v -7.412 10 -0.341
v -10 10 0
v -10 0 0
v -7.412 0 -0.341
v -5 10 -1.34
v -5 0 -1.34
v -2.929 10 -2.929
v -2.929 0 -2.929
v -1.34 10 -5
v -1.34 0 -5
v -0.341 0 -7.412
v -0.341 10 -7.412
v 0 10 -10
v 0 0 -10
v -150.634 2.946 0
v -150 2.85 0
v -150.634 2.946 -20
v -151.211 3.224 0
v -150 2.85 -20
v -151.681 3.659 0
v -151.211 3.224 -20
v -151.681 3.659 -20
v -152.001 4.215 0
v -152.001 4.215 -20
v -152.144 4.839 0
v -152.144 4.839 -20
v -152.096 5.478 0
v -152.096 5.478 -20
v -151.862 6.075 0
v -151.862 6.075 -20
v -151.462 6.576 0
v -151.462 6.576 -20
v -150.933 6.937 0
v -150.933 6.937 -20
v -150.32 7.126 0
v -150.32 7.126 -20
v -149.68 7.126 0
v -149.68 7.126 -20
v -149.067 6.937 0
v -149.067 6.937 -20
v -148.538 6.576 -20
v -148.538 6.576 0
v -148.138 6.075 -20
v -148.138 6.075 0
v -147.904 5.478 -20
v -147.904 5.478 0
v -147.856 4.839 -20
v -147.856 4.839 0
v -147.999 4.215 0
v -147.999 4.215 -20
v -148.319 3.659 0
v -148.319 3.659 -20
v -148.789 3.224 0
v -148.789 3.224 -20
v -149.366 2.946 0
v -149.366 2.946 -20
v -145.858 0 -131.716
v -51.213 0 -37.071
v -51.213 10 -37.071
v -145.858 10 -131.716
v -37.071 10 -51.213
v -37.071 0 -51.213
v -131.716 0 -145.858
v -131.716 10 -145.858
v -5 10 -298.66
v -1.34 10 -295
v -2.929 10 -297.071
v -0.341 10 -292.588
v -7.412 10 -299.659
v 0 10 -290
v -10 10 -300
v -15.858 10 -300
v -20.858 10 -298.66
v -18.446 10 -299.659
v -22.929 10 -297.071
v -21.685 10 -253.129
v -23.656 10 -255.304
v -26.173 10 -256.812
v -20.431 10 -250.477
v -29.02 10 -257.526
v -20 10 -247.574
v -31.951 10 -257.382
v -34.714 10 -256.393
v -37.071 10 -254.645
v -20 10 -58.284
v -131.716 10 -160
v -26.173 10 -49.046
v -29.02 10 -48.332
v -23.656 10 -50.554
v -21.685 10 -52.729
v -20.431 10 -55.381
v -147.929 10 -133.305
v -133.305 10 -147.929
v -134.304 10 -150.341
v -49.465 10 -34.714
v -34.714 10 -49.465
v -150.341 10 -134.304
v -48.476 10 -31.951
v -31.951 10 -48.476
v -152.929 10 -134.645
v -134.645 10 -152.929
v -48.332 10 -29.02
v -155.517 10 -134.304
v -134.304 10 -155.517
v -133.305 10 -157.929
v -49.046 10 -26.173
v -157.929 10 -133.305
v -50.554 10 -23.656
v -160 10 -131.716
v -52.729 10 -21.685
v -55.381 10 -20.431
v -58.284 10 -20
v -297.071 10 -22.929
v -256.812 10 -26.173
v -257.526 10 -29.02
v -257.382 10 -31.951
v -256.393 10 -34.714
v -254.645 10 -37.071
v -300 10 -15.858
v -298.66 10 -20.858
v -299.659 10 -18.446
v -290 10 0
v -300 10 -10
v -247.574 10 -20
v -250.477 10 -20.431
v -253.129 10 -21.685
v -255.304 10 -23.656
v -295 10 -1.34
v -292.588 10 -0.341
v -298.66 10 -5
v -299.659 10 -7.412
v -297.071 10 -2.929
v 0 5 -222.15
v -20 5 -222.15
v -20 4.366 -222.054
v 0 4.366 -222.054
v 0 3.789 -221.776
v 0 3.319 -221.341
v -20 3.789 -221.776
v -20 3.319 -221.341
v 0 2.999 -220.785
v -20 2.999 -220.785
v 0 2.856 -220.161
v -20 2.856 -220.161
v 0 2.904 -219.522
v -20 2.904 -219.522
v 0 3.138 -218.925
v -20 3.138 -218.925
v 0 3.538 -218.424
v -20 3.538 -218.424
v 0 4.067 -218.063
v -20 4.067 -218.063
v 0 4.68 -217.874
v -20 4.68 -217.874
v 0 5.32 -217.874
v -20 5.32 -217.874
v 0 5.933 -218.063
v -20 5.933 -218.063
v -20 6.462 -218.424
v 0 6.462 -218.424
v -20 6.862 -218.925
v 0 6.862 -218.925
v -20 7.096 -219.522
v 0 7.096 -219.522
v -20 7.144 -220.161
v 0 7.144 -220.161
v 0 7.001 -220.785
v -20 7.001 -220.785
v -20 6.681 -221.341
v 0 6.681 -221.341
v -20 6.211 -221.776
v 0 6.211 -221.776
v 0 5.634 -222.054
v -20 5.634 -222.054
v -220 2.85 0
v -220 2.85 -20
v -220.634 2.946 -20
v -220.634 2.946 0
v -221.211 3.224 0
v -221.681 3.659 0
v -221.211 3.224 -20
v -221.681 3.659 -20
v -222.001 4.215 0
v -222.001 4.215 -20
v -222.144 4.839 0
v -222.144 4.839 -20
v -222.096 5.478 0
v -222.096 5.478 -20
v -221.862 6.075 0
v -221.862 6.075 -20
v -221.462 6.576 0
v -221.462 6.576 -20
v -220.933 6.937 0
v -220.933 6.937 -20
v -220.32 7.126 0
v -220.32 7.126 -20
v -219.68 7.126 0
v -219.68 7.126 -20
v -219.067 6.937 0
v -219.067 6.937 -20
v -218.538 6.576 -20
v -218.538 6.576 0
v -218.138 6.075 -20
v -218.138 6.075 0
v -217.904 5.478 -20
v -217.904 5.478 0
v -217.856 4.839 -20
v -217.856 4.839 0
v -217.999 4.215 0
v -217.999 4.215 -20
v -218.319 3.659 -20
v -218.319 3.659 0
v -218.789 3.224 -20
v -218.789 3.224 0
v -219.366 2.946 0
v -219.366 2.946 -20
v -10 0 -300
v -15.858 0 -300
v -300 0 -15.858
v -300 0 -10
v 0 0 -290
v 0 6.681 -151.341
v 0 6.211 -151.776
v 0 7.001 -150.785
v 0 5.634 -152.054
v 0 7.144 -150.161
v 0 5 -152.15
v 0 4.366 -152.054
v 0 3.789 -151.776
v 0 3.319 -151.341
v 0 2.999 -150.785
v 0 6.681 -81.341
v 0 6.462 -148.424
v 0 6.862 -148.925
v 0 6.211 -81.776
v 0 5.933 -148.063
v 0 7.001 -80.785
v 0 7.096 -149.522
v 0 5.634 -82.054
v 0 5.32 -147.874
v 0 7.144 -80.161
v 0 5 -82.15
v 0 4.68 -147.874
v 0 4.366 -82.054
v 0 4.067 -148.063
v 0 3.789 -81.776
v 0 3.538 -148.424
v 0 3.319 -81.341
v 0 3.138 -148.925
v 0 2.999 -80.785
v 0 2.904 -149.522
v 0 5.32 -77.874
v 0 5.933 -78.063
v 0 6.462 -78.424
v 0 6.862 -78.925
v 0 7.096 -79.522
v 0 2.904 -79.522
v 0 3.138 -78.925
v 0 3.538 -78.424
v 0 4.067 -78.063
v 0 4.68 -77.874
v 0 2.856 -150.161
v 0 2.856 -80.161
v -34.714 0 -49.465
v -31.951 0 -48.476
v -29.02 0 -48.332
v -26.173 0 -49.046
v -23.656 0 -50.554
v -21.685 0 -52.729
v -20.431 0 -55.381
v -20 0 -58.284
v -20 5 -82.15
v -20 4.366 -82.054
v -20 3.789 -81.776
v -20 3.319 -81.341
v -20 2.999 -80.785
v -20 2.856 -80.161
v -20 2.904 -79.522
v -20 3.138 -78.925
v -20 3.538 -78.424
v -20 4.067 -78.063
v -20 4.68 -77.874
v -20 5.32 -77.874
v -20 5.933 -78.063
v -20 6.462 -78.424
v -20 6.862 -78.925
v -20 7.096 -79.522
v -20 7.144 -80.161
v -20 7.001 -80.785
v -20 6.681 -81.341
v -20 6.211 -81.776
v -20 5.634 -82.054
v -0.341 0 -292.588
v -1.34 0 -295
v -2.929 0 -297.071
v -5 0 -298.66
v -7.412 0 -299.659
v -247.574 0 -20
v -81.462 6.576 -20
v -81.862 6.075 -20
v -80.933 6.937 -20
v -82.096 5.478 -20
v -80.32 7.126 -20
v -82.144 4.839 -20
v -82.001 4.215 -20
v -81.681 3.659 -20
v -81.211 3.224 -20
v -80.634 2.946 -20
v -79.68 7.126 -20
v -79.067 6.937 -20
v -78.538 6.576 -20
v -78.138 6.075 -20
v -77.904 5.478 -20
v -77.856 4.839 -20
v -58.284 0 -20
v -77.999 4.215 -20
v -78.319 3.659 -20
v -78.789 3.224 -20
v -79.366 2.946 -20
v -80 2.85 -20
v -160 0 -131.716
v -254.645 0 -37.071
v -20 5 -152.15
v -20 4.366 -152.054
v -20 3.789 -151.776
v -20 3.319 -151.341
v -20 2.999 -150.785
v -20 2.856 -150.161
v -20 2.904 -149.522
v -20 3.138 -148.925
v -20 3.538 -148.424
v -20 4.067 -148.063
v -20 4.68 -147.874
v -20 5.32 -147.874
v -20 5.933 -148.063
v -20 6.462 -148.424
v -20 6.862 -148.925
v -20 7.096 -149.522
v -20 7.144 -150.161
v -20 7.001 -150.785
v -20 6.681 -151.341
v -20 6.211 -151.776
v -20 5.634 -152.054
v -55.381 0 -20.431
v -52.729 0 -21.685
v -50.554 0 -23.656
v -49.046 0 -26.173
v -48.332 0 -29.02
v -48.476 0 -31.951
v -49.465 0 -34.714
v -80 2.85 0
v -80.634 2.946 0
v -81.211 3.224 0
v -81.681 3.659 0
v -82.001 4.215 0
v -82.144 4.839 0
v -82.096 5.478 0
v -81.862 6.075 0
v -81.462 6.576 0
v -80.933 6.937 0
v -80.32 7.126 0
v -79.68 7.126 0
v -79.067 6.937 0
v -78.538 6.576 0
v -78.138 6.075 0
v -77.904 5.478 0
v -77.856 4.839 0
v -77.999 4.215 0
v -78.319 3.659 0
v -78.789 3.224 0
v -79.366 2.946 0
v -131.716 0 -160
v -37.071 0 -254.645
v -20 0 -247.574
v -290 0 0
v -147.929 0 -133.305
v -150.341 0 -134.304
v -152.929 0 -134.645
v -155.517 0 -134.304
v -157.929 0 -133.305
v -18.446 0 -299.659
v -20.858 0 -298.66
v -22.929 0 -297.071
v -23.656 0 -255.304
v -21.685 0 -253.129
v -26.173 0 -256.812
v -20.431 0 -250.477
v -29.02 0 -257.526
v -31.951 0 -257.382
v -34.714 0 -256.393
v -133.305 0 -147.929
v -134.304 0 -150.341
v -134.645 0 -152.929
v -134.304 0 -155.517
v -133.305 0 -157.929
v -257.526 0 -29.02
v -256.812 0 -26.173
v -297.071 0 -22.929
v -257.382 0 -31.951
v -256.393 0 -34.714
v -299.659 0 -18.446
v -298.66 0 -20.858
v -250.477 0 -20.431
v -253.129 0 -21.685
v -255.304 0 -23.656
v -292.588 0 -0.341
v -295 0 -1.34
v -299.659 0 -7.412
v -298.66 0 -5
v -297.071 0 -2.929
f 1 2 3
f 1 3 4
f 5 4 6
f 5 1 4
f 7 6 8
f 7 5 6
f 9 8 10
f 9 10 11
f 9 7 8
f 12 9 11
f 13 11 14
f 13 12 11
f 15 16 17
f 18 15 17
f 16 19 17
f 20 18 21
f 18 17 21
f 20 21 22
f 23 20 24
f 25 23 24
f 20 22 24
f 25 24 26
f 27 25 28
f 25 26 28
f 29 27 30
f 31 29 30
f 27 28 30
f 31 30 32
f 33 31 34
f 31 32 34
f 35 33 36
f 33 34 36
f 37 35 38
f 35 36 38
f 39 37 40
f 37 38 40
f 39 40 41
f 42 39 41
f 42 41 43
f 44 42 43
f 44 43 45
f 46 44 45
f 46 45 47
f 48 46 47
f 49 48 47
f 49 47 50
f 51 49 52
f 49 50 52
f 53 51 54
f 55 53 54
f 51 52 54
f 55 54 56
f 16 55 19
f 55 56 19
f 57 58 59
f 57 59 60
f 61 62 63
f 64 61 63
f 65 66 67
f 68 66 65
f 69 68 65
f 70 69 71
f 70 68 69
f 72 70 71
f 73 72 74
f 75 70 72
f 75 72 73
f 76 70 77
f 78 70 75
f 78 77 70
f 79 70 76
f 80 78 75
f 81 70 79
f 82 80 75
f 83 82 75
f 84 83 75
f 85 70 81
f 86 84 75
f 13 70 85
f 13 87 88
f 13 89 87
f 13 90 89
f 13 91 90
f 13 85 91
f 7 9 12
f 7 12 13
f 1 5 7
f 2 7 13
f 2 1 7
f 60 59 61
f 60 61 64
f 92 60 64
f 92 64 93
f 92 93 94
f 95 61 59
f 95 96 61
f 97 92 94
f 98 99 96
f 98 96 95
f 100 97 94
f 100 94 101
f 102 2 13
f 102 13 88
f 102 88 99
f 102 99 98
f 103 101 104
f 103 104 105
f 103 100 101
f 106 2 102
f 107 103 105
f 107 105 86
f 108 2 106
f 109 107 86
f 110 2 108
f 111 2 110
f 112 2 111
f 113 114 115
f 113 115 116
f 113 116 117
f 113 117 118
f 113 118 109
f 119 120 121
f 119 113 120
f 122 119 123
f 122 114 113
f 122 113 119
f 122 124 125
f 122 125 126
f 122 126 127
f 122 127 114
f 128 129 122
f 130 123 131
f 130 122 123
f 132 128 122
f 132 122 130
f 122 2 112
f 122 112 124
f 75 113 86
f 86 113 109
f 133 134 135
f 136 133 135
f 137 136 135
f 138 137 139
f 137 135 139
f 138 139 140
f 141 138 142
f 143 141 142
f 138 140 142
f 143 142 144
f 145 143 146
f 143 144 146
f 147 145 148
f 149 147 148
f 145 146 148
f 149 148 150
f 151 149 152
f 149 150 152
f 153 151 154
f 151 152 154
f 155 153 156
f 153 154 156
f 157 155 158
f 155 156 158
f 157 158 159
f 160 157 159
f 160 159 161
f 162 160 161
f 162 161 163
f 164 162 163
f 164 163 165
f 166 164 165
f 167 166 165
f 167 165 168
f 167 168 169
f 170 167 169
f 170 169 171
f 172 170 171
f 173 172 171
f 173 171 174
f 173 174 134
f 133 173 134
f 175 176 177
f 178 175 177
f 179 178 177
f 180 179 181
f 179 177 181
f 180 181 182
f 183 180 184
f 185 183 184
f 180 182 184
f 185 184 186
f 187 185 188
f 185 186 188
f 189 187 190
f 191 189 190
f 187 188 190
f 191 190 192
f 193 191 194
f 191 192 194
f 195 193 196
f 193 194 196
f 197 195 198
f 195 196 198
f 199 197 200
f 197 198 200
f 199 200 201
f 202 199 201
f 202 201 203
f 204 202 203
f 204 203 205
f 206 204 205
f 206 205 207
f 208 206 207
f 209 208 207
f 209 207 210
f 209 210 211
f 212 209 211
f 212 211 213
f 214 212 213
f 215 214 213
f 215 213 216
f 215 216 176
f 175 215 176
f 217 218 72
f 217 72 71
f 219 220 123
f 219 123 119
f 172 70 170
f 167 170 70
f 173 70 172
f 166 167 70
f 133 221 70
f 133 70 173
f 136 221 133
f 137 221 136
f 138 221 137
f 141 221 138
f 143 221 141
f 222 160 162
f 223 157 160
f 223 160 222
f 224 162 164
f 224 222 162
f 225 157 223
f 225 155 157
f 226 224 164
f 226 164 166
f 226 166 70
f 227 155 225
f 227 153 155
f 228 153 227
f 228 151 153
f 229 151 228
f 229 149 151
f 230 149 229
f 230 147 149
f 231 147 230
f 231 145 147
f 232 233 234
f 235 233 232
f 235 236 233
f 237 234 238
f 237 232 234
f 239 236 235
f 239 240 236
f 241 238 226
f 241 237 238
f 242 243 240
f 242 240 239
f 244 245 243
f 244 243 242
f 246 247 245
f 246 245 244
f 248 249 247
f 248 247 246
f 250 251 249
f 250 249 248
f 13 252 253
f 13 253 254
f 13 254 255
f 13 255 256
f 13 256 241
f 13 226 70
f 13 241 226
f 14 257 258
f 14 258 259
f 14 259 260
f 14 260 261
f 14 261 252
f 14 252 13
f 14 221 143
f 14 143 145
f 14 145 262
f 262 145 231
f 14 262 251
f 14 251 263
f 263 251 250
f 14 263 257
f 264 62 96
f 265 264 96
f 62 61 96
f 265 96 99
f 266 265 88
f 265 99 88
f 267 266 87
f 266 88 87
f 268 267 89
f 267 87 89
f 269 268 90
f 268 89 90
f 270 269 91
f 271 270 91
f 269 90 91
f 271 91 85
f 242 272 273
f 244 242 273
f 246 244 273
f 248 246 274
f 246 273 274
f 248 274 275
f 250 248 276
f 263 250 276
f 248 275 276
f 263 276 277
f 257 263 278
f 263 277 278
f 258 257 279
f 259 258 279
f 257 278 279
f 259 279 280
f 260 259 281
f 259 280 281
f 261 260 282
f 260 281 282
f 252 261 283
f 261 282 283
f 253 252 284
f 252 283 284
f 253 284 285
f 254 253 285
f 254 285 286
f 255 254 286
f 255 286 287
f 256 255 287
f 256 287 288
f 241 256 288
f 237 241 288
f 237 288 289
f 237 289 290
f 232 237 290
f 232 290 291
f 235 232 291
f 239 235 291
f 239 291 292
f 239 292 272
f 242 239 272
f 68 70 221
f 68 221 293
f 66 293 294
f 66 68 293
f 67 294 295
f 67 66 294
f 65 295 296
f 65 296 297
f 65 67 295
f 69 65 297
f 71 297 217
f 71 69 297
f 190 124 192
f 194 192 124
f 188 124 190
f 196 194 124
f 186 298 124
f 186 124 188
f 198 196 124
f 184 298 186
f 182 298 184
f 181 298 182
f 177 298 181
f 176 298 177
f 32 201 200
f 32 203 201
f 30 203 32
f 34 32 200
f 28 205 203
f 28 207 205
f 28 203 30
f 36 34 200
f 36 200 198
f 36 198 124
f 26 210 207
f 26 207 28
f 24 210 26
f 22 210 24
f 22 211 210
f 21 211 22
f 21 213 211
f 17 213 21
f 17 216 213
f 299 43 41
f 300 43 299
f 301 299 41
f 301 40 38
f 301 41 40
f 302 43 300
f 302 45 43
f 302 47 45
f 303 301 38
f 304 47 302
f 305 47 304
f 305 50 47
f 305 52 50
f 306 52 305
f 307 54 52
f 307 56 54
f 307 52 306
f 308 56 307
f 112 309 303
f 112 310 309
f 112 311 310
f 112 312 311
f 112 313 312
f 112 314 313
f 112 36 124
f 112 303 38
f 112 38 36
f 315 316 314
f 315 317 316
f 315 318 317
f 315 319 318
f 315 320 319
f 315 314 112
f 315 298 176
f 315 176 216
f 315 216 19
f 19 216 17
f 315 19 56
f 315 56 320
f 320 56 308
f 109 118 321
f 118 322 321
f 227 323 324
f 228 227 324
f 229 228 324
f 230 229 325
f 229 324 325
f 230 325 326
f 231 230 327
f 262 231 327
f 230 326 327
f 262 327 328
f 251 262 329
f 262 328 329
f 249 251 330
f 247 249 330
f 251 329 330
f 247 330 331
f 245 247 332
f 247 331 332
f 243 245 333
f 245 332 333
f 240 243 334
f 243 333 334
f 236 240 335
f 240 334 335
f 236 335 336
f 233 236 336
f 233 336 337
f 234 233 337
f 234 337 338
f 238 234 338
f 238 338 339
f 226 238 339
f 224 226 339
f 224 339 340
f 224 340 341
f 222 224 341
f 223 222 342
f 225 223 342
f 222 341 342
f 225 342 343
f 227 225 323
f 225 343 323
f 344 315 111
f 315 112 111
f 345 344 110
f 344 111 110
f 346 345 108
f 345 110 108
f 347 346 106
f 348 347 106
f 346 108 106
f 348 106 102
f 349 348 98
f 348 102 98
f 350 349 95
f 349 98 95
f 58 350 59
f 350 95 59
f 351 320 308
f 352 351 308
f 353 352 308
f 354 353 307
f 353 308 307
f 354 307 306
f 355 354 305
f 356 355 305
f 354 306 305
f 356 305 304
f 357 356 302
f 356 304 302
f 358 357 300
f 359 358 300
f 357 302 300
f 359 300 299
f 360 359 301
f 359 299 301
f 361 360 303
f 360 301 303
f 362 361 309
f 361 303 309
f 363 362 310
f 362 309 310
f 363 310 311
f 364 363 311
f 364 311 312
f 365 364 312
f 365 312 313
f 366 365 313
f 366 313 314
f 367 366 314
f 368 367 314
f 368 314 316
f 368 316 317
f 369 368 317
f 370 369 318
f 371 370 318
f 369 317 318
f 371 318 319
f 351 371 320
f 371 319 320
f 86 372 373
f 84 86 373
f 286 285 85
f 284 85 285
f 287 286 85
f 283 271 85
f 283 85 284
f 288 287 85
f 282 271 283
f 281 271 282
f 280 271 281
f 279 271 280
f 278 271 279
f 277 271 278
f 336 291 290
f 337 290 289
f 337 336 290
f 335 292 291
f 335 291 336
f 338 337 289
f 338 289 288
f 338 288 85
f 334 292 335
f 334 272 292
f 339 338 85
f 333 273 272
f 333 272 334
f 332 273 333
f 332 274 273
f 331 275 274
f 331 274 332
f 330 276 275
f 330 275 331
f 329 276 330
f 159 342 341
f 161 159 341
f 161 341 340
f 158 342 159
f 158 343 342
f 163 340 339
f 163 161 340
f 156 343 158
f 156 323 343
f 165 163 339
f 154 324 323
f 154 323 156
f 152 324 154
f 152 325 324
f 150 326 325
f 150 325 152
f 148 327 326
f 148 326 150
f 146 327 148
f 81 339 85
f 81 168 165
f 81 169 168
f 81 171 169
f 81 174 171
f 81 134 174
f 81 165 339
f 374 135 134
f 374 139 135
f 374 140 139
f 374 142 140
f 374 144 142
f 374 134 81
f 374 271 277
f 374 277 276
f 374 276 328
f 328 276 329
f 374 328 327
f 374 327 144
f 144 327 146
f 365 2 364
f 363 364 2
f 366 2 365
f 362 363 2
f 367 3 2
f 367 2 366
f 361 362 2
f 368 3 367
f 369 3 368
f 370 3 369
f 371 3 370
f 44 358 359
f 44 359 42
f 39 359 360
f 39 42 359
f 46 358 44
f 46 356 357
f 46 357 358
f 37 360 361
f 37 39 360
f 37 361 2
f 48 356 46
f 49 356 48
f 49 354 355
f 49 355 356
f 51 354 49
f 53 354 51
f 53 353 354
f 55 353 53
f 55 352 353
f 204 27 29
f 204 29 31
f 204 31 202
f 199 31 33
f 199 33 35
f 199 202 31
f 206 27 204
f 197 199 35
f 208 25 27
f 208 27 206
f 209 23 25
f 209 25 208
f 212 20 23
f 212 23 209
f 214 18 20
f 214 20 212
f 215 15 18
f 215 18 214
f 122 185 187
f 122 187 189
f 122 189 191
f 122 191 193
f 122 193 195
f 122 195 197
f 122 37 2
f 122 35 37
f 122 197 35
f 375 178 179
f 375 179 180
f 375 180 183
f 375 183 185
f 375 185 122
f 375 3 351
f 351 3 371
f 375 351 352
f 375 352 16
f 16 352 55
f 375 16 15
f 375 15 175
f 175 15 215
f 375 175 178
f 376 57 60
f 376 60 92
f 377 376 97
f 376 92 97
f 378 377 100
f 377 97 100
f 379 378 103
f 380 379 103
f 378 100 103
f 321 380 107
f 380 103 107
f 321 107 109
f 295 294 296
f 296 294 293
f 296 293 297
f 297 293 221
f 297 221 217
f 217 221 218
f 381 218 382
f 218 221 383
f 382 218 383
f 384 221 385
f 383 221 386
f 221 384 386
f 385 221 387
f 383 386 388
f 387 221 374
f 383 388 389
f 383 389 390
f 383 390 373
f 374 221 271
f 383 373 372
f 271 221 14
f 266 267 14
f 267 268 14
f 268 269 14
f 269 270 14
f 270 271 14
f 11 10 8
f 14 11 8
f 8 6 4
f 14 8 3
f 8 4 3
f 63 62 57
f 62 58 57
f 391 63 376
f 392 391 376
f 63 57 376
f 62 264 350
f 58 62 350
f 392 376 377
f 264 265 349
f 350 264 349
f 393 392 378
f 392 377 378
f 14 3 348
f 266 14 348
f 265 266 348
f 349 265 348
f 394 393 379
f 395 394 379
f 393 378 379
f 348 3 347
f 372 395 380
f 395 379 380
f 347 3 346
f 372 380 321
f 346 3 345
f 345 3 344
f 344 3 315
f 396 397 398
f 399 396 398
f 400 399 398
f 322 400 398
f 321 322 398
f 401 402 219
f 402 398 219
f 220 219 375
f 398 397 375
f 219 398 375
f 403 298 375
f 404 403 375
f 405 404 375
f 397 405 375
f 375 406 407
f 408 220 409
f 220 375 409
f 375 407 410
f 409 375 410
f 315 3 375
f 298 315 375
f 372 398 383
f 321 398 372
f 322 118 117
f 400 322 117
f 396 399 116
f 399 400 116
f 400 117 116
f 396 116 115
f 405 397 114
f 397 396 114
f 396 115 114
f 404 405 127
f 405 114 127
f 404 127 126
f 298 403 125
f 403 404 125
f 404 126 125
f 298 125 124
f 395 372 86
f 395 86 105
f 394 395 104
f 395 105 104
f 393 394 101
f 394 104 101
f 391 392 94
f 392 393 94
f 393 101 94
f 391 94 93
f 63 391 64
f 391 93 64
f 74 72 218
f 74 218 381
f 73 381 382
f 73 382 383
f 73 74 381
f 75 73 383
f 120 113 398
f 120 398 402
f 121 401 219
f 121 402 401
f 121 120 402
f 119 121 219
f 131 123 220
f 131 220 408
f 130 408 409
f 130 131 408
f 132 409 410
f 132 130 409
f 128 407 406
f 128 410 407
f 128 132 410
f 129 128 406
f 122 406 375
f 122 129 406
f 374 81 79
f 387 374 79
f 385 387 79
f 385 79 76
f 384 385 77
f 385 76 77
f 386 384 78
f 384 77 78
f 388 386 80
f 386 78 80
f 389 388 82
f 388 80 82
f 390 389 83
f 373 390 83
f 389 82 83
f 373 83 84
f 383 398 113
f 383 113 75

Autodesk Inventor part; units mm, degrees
ref_plane "YZ Plane" through (0, 0, 0) normal (1, 0, 0) x (0, 1, 0)
ref_plane "XZ Plane" through (0, 0, 0) normal (0, 1, 0) x (-1, 0, 0)
ref_plane "XY Plane" through (0, 0, 0) normal (0, 0, 1) x (1, 0, 0)
sketch "Sketch1" plane through (0, 0, 0) normal (0, 1, 0) x (-1, 0, 0)
  line L0 (0, 0) -> (20, 0)
  line L1 (20, 0) -> (20, -300)
  line L2 (20, -300) -> (0, -300)
  line L3 (0, -300) -> (0, 0)
  line L4 (0, 0) -> (300, 0)
  line L5 (300, 0) -> (300, -20)
  line L6 (300, -20) -> (0, -20)
  line L7 (0, -20) -> (0, 0)
  line L8 (300, -20) -> (20, -300)
  line L9 (285.8579, -5.8579) -> (5.8579, -285.8579)
  line L10 (-7.0711, -7.0711) -> (152.9289, -167.0711)
  line L11 (7.0711, 7.0711) -> (167.0711, -152.9289)
  point P0 (138.7868, -152.9289)
  point P1 (20, -271.7157)
  point P2 (20, -34.1421)
  point P3 (152.9289, -138.7868)
  point P4 (34.1421, -20)
  point P5 (271.7157, -20)
  dimension "d32" = 20
  dimension "d33" = 300
  dimension "d34" = 300
  dimension "d35" = 20
  dimension "d36" = 20
extrude "Extrusion1" add sketch "Sketch1" along normal blind 10 contours L0 L11 L1 L6 L10 L3 | L0 L1 L11 | L10 L6 L3 | L4 L5 L6 L11 L1 | L11 L6 L1 | L6 L10 L1 L2 L3 | L6 L1 L10 | L6 L11 L9 L10 L1 | L8 L11 L9 L6 | L11 L8 L10 L9 | L1 L9 L10 L8
fillet "Fillet1" radius 10 11 edges at (-300, 5, 0) (-300, 5, -20) (-271.7157, 5, -20) (-152.9289, 5, -138.7868) (-138.7868, 5, -152.9289) (-34.1421, 5, -20) (-20, 5, -34.1421) (0, 5, 0) (-20, 5, -300) (0, 5, -300) (-20, 5, -271.7157)
sketch "Sketch3" plane through (-290, 0, 0) normal (0, 0, 1) x (1, 0, 0)
  line L0 (0, 0) -> (0, 10) projected
  line L1 (0, 5) -> (70, 5)
  line L2 (70, 5) -> (140, 5)
  line L3 (140, 5) -> (210, 5)
  line L4 (210, 5) -> (280, 5)
  point P0 (290, 0)
  dimension "d39" = 70
  dimension "d40" = 70
  dimension "d41" = 70
  dimension "d42" = 70
hole "Hole2" at (-220, 5, 0) at (-150, 5, 0) at (-80, 5, 0) direction (0, 0, -1) diameter 4.3 depth 20 clearance for "Socket Head Cap Screw ISO 4762" size "M4" standard "ISO"
sketch "Sketch4" plane through (0, 0, -10) normal (1, 0, 0) x (0, 0, -1)
  line L0 (280, 10) -> (280, 0) projected
  line L1 (280, 5) -> (210, 5)
  line L2 (210, 5) -> (140, 5)
  line L3 (140, 5) -> (70, 5)
  line L4 (70, 5) -> (0, 5)
  point P0 (-10, 0)
  dimension "d50" = 70
  dimension "d51" = 70
  dimension "d52" = 70
  dimension "d53" = 70
hole "Hole3" at (0, 5, -220) at (0, 5, -150) at (0, 5, -80) direction (-1, 0, 0) diameter 4.3 depth 20 clearance for "Socket Head Cap Screw ISO 4762" size "M4" standard "ISO"
properties part number "Aufhängung_Gerüst"
